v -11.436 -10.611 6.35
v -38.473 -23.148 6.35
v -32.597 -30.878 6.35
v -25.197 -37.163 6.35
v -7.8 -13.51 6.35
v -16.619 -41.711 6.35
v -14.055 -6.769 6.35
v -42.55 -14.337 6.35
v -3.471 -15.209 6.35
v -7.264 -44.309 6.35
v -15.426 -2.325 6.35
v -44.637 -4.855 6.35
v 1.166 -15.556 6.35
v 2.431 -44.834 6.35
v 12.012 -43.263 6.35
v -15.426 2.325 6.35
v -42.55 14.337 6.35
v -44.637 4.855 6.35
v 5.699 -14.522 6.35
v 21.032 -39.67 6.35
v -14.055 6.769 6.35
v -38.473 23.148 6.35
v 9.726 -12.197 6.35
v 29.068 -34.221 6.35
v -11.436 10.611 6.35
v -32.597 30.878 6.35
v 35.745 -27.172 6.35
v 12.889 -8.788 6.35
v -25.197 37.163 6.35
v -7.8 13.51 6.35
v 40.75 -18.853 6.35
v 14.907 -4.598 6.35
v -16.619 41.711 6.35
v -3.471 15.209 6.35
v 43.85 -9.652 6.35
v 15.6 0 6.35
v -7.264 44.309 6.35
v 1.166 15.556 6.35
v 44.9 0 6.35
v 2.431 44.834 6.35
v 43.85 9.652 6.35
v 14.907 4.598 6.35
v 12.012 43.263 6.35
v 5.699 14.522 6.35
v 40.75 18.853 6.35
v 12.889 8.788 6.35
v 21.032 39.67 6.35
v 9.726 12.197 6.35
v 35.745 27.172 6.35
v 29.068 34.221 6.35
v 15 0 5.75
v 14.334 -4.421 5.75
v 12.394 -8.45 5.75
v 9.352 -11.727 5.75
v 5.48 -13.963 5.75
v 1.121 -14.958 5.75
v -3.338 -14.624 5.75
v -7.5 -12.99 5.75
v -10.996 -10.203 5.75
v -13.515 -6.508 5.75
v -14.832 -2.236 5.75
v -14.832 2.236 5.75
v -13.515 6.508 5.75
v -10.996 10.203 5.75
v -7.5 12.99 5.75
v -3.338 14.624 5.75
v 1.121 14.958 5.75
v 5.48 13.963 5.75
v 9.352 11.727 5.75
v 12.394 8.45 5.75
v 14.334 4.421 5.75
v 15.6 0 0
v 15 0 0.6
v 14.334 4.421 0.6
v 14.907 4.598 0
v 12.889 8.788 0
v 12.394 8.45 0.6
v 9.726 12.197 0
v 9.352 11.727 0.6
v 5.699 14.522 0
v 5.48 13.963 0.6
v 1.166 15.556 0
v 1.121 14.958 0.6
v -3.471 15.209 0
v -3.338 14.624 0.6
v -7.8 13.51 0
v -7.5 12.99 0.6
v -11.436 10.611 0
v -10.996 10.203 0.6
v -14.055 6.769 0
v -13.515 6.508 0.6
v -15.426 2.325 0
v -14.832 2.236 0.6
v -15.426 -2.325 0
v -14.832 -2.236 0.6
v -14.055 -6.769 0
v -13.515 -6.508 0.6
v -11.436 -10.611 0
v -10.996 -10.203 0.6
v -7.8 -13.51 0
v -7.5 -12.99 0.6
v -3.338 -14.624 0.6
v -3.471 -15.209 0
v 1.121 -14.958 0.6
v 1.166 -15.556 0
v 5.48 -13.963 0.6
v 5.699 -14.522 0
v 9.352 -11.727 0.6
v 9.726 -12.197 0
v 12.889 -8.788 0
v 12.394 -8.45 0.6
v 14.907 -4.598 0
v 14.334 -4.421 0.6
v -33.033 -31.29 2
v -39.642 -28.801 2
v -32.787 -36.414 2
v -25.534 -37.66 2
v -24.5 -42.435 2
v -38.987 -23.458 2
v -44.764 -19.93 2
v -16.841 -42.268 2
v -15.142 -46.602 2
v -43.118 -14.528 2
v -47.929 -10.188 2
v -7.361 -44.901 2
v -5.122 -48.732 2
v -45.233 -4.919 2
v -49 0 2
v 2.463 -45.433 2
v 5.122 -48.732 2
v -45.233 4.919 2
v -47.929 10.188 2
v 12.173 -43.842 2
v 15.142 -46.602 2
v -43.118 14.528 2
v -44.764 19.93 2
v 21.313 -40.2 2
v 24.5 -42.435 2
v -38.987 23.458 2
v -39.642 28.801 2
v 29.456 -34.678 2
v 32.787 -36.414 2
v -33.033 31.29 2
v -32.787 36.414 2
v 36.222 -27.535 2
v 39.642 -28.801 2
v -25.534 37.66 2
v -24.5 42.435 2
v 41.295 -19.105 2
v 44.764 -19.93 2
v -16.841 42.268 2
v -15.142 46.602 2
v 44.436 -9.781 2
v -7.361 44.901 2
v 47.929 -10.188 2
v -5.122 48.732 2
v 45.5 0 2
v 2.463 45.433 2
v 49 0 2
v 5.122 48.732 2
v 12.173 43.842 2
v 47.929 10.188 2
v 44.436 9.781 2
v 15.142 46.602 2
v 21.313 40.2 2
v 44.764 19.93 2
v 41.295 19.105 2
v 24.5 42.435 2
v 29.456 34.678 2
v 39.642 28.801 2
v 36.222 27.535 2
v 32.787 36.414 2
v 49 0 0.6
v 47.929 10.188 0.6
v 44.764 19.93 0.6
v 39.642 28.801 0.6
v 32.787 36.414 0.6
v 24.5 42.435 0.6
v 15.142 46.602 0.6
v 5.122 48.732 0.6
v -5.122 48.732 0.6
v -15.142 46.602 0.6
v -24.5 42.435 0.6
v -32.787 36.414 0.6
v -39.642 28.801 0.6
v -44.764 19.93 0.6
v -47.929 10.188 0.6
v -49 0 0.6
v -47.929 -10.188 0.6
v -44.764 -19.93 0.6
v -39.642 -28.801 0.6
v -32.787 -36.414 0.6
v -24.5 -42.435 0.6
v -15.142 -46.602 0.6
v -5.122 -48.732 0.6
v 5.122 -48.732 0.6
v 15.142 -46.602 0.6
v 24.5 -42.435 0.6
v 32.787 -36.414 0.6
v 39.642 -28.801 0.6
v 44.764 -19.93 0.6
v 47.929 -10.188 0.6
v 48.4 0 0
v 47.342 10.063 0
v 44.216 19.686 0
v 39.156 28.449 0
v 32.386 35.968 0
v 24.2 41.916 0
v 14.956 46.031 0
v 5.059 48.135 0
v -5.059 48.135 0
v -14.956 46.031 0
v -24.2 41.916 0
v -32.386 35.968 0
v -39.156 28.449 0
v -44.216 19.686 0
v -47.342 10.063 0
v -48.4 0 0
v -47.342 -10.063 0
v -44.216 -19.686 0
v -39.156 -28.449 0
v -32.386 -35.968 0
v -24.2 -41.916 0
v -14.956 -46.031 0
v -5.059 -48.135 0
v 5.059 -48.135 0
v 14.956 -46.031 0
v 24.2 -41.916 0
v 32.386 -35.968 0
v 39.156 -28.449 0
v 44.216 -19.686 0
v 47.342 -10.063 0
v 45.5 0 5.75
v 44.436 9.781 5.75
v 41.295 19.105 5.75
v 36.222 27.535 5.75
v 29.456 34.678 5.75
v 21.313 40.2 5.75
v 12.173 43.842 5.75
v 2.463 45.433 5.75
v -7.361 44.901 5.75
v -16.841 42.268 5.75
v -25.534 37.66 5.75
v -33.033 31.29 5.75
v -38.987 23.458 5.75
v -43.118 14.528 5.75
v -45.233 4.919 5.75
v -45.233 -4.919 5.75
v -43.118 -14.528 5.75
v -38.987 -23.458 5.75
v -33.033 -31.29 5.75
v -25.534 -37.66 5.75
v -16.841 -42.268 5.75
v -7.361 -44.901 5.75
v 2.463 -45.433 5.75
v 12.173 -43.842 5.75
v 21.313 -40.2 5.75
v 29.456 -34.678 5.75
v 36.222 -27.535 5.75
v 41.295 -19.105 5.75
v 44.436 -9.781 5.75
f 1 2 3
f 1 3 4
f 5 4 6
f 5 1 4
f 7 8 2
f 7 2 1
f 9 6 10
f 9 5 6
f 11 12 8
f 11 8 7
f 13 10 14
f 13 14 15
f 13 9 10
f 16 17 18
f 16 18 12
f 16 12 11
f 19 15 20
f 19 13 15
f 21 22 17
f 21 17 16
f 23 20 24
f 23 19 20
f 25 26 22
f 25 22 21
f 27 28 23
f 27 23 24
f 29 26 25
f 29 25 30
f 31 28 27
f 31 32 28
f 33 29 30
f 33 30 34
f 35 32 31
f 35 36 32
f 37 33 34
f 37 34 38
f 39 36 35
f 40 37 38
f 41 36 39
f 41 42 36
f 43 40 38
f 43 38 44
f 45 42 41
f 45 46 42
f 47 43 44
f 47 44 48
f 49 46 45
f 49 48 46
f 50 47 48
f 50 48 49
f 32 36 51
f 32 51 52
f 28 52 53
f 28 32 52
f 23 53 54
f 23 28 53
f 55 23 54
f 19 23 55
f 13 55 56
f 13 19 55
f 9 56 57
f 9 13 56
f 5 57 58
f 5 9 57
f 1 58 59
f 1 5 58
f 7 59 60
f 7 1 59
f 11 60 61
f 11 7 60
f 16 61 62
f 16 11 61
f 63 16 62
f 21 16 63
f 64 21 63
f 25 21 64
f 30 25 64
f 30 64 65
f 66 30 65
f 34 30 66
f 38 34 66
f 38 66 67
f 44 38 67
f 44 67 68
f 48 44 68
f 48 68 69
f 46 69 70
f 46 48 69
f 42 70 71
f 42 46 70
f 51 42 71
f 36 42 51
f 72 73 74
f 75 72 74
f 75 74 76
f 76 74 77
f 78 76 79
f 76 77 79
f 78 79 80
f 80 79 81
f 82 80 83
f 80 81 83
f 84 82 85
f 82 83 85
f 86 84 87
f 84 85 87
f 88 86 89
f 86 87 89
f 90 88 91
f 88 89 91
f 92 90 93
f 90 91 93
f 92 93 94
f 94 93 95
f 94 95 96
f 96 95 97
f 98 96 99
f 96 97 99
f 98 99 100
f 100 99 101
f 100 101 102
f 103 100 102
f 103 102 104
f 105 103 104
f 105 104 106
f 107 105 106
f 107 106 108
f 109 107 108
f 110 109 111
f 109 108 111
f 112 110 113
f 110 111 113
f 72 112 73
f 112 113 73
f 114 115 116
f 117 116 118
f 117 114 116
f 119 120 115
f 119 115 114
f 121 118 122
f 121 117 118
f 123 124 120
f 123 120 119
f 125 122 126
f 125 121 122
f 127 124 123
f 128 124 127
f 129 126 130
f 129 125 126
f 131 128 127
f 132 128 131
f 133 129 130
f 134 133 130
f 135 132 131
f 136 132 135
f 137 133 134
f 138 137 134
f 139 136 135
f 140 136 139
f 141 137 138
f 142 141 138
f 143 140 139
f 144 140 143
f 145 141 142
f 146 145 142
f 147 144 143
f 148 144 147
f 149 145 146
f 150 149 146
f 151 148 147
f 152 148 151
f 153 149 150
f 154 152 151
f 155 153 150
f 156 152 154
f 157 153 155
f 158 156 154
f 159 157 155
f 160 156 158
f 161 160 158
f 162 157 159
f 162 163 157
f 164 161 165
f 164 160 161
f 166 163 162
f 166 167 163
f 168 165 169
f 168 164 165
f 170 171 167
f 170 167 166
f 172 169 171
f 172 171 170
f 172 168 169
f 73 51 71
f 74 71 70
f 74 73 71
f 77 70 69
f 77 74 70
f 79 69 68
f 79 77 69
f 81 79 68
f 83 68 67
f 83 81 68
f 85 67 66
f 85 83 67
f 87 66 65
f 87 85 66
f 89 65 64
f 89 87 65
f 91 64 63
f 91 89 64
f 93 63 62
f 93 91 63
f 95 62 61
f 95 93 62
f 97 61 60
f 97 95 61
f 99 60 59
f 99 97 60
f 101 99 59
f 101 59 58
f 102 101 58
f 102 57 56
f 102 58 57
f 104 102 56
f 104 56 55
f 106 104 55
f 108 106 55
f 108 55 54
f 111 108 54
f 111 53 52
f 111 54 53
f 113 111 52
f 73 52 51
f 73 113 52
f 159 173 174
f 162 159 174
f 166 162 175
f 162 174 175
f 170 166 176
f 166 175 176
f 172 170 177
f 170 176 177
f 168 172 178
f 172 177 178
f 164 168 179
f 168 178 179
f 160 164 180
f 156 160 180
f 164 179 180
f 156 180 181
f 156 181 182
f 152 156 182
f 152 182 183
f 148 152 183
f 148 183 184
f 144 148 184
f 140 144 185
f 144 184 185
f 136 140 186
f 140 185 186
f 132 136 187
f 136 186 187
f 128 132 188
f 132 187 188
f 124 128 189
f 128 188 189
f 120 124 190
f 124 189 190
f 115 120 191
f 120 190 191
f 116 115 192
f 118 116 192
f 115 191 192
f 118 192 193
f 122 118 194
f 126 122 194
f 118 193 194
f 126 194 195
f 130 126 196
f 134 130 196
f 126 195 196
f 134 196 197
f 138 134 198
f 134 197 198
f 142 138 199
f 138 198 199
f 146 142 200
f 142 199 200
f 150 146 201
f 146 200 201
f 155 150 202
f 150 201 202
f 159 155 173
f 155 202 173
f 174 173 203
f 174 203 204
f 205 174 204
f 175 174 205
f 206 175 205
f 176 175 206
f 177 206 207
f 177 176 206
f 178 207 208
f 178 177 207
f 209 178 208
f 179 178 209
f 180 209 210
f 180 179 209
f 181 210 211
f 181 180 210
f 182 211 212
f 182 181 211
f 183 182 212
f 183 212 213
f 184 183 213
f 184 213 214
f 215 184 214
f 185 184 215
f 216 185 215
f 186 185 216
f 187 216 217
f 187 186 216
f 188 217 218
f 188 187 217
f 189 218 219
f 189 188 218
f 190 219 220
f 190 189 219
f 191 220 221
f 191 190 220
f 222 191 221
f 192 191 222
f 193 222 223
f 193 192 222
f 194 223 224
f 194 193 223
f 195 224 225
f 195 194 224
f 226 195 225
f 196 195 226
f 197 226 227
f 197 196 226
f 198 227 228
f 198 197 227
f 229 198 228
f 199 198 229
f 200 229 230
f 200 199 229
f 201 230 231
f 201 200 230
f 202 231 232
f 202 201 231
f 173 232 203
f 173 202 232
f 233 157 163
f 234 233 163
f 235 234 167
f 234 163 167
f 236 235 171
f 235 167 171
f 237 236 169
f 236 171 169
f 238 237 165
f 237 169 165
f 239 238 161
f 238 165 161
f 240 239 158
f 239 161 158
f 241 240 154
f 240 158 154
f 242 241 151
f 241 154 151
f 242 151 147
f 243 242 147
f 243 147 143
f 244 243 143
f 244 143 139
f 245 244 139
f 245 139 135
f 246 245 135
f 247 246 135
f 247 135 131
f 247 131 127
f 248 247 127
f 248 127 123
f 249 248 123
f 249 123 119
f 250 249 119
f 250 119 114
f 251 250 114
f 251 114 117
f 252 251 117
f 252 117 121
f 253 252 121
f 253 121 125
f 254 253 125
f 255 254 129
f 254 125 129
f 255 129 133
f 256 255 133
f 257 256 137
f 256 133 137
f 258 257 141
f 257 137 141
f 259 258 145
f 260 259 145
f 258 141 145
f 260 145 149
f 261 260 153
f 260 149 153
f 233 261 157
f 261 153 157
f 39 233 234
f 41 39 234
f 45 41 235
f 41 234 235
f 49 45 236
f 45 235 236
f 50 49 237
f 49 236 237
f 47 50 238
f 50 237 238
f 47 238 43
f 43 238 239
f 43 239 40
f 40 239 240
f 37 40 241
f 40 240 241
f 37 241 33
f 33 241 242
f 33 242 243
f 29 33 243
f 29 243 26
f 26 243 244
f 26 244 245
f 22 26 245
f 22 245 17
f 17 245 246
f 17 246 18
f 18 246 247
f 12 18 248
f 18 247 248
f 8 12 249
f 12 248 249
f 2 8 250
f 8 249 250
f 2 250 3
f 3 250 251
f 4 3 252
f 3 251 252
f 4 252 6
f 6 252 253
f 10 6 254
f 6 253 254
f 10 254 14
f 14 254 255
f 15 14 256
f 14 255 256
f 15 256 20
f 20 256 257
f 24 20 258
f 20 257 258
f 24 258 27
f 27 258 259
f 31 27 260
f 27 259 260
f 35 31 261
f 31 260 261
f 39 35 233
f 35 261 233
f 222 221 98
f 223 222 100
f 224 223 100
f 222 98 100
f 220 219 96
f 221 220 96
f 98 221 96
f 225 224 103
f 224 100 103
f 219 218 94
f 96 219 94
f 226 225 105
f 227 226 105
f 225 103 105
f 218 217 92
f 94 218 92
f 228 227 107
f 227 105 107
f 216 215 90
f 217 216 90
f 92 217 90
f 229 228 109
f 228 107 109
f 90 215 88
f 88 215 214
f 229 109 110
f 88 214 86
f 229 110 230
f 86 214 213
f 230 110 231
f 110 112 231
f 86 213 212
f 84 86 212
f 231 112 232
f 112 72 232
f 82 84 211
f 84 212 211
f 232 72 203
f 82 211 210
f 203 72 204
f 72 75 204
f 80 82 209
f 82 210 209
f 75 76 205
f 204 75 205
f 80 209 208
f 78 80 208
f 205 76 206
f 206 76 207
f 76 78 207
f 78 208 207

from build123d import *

# Parameters (mm, degrees)
SKETCH_R     = 49
PAD_DEPTH    = 2
SKETCH001_R  = 45.5
PAD001_DEPTH = 6.35
SKETCH002_R  = 15
POCKET_DEPTH = 6.351
CHAMFER_SIZE = 0.6


with BuildPart() as part:
    # Sketch → Pad (new body)
    with BuildSketch(Plane.XY):
        Circle(SKETCH_R)
    extrude(amount=PAD_DEPTH)

    # Sketch001 → Pad001 (join)
    with BuildSketch(Plane.XY):
        Circle(SKETCH001_R)
    extrude(amount=PAD001_DEPTH)

    # Sketch002 → Pocket (cut, through all)
    with BuildSketch(Plane.XY):
        Circle(SKETCH002_R)
    extrude(amount=POCKET_DEPTH, mode=Mode.SUBTRACT)

    # Chamfer
    chamfer_edges = [part.edges().sort_by_distance(p)[0] for p in [
        (-45.5, 0, 6.35),
        (-15, 0, 6.35),
        (-49, 0, 0),
        (-15, 0, 0),
    ]]
    chamfer(chamfer_edges, length=CHAMFER_SIZE)


solid = part.part
